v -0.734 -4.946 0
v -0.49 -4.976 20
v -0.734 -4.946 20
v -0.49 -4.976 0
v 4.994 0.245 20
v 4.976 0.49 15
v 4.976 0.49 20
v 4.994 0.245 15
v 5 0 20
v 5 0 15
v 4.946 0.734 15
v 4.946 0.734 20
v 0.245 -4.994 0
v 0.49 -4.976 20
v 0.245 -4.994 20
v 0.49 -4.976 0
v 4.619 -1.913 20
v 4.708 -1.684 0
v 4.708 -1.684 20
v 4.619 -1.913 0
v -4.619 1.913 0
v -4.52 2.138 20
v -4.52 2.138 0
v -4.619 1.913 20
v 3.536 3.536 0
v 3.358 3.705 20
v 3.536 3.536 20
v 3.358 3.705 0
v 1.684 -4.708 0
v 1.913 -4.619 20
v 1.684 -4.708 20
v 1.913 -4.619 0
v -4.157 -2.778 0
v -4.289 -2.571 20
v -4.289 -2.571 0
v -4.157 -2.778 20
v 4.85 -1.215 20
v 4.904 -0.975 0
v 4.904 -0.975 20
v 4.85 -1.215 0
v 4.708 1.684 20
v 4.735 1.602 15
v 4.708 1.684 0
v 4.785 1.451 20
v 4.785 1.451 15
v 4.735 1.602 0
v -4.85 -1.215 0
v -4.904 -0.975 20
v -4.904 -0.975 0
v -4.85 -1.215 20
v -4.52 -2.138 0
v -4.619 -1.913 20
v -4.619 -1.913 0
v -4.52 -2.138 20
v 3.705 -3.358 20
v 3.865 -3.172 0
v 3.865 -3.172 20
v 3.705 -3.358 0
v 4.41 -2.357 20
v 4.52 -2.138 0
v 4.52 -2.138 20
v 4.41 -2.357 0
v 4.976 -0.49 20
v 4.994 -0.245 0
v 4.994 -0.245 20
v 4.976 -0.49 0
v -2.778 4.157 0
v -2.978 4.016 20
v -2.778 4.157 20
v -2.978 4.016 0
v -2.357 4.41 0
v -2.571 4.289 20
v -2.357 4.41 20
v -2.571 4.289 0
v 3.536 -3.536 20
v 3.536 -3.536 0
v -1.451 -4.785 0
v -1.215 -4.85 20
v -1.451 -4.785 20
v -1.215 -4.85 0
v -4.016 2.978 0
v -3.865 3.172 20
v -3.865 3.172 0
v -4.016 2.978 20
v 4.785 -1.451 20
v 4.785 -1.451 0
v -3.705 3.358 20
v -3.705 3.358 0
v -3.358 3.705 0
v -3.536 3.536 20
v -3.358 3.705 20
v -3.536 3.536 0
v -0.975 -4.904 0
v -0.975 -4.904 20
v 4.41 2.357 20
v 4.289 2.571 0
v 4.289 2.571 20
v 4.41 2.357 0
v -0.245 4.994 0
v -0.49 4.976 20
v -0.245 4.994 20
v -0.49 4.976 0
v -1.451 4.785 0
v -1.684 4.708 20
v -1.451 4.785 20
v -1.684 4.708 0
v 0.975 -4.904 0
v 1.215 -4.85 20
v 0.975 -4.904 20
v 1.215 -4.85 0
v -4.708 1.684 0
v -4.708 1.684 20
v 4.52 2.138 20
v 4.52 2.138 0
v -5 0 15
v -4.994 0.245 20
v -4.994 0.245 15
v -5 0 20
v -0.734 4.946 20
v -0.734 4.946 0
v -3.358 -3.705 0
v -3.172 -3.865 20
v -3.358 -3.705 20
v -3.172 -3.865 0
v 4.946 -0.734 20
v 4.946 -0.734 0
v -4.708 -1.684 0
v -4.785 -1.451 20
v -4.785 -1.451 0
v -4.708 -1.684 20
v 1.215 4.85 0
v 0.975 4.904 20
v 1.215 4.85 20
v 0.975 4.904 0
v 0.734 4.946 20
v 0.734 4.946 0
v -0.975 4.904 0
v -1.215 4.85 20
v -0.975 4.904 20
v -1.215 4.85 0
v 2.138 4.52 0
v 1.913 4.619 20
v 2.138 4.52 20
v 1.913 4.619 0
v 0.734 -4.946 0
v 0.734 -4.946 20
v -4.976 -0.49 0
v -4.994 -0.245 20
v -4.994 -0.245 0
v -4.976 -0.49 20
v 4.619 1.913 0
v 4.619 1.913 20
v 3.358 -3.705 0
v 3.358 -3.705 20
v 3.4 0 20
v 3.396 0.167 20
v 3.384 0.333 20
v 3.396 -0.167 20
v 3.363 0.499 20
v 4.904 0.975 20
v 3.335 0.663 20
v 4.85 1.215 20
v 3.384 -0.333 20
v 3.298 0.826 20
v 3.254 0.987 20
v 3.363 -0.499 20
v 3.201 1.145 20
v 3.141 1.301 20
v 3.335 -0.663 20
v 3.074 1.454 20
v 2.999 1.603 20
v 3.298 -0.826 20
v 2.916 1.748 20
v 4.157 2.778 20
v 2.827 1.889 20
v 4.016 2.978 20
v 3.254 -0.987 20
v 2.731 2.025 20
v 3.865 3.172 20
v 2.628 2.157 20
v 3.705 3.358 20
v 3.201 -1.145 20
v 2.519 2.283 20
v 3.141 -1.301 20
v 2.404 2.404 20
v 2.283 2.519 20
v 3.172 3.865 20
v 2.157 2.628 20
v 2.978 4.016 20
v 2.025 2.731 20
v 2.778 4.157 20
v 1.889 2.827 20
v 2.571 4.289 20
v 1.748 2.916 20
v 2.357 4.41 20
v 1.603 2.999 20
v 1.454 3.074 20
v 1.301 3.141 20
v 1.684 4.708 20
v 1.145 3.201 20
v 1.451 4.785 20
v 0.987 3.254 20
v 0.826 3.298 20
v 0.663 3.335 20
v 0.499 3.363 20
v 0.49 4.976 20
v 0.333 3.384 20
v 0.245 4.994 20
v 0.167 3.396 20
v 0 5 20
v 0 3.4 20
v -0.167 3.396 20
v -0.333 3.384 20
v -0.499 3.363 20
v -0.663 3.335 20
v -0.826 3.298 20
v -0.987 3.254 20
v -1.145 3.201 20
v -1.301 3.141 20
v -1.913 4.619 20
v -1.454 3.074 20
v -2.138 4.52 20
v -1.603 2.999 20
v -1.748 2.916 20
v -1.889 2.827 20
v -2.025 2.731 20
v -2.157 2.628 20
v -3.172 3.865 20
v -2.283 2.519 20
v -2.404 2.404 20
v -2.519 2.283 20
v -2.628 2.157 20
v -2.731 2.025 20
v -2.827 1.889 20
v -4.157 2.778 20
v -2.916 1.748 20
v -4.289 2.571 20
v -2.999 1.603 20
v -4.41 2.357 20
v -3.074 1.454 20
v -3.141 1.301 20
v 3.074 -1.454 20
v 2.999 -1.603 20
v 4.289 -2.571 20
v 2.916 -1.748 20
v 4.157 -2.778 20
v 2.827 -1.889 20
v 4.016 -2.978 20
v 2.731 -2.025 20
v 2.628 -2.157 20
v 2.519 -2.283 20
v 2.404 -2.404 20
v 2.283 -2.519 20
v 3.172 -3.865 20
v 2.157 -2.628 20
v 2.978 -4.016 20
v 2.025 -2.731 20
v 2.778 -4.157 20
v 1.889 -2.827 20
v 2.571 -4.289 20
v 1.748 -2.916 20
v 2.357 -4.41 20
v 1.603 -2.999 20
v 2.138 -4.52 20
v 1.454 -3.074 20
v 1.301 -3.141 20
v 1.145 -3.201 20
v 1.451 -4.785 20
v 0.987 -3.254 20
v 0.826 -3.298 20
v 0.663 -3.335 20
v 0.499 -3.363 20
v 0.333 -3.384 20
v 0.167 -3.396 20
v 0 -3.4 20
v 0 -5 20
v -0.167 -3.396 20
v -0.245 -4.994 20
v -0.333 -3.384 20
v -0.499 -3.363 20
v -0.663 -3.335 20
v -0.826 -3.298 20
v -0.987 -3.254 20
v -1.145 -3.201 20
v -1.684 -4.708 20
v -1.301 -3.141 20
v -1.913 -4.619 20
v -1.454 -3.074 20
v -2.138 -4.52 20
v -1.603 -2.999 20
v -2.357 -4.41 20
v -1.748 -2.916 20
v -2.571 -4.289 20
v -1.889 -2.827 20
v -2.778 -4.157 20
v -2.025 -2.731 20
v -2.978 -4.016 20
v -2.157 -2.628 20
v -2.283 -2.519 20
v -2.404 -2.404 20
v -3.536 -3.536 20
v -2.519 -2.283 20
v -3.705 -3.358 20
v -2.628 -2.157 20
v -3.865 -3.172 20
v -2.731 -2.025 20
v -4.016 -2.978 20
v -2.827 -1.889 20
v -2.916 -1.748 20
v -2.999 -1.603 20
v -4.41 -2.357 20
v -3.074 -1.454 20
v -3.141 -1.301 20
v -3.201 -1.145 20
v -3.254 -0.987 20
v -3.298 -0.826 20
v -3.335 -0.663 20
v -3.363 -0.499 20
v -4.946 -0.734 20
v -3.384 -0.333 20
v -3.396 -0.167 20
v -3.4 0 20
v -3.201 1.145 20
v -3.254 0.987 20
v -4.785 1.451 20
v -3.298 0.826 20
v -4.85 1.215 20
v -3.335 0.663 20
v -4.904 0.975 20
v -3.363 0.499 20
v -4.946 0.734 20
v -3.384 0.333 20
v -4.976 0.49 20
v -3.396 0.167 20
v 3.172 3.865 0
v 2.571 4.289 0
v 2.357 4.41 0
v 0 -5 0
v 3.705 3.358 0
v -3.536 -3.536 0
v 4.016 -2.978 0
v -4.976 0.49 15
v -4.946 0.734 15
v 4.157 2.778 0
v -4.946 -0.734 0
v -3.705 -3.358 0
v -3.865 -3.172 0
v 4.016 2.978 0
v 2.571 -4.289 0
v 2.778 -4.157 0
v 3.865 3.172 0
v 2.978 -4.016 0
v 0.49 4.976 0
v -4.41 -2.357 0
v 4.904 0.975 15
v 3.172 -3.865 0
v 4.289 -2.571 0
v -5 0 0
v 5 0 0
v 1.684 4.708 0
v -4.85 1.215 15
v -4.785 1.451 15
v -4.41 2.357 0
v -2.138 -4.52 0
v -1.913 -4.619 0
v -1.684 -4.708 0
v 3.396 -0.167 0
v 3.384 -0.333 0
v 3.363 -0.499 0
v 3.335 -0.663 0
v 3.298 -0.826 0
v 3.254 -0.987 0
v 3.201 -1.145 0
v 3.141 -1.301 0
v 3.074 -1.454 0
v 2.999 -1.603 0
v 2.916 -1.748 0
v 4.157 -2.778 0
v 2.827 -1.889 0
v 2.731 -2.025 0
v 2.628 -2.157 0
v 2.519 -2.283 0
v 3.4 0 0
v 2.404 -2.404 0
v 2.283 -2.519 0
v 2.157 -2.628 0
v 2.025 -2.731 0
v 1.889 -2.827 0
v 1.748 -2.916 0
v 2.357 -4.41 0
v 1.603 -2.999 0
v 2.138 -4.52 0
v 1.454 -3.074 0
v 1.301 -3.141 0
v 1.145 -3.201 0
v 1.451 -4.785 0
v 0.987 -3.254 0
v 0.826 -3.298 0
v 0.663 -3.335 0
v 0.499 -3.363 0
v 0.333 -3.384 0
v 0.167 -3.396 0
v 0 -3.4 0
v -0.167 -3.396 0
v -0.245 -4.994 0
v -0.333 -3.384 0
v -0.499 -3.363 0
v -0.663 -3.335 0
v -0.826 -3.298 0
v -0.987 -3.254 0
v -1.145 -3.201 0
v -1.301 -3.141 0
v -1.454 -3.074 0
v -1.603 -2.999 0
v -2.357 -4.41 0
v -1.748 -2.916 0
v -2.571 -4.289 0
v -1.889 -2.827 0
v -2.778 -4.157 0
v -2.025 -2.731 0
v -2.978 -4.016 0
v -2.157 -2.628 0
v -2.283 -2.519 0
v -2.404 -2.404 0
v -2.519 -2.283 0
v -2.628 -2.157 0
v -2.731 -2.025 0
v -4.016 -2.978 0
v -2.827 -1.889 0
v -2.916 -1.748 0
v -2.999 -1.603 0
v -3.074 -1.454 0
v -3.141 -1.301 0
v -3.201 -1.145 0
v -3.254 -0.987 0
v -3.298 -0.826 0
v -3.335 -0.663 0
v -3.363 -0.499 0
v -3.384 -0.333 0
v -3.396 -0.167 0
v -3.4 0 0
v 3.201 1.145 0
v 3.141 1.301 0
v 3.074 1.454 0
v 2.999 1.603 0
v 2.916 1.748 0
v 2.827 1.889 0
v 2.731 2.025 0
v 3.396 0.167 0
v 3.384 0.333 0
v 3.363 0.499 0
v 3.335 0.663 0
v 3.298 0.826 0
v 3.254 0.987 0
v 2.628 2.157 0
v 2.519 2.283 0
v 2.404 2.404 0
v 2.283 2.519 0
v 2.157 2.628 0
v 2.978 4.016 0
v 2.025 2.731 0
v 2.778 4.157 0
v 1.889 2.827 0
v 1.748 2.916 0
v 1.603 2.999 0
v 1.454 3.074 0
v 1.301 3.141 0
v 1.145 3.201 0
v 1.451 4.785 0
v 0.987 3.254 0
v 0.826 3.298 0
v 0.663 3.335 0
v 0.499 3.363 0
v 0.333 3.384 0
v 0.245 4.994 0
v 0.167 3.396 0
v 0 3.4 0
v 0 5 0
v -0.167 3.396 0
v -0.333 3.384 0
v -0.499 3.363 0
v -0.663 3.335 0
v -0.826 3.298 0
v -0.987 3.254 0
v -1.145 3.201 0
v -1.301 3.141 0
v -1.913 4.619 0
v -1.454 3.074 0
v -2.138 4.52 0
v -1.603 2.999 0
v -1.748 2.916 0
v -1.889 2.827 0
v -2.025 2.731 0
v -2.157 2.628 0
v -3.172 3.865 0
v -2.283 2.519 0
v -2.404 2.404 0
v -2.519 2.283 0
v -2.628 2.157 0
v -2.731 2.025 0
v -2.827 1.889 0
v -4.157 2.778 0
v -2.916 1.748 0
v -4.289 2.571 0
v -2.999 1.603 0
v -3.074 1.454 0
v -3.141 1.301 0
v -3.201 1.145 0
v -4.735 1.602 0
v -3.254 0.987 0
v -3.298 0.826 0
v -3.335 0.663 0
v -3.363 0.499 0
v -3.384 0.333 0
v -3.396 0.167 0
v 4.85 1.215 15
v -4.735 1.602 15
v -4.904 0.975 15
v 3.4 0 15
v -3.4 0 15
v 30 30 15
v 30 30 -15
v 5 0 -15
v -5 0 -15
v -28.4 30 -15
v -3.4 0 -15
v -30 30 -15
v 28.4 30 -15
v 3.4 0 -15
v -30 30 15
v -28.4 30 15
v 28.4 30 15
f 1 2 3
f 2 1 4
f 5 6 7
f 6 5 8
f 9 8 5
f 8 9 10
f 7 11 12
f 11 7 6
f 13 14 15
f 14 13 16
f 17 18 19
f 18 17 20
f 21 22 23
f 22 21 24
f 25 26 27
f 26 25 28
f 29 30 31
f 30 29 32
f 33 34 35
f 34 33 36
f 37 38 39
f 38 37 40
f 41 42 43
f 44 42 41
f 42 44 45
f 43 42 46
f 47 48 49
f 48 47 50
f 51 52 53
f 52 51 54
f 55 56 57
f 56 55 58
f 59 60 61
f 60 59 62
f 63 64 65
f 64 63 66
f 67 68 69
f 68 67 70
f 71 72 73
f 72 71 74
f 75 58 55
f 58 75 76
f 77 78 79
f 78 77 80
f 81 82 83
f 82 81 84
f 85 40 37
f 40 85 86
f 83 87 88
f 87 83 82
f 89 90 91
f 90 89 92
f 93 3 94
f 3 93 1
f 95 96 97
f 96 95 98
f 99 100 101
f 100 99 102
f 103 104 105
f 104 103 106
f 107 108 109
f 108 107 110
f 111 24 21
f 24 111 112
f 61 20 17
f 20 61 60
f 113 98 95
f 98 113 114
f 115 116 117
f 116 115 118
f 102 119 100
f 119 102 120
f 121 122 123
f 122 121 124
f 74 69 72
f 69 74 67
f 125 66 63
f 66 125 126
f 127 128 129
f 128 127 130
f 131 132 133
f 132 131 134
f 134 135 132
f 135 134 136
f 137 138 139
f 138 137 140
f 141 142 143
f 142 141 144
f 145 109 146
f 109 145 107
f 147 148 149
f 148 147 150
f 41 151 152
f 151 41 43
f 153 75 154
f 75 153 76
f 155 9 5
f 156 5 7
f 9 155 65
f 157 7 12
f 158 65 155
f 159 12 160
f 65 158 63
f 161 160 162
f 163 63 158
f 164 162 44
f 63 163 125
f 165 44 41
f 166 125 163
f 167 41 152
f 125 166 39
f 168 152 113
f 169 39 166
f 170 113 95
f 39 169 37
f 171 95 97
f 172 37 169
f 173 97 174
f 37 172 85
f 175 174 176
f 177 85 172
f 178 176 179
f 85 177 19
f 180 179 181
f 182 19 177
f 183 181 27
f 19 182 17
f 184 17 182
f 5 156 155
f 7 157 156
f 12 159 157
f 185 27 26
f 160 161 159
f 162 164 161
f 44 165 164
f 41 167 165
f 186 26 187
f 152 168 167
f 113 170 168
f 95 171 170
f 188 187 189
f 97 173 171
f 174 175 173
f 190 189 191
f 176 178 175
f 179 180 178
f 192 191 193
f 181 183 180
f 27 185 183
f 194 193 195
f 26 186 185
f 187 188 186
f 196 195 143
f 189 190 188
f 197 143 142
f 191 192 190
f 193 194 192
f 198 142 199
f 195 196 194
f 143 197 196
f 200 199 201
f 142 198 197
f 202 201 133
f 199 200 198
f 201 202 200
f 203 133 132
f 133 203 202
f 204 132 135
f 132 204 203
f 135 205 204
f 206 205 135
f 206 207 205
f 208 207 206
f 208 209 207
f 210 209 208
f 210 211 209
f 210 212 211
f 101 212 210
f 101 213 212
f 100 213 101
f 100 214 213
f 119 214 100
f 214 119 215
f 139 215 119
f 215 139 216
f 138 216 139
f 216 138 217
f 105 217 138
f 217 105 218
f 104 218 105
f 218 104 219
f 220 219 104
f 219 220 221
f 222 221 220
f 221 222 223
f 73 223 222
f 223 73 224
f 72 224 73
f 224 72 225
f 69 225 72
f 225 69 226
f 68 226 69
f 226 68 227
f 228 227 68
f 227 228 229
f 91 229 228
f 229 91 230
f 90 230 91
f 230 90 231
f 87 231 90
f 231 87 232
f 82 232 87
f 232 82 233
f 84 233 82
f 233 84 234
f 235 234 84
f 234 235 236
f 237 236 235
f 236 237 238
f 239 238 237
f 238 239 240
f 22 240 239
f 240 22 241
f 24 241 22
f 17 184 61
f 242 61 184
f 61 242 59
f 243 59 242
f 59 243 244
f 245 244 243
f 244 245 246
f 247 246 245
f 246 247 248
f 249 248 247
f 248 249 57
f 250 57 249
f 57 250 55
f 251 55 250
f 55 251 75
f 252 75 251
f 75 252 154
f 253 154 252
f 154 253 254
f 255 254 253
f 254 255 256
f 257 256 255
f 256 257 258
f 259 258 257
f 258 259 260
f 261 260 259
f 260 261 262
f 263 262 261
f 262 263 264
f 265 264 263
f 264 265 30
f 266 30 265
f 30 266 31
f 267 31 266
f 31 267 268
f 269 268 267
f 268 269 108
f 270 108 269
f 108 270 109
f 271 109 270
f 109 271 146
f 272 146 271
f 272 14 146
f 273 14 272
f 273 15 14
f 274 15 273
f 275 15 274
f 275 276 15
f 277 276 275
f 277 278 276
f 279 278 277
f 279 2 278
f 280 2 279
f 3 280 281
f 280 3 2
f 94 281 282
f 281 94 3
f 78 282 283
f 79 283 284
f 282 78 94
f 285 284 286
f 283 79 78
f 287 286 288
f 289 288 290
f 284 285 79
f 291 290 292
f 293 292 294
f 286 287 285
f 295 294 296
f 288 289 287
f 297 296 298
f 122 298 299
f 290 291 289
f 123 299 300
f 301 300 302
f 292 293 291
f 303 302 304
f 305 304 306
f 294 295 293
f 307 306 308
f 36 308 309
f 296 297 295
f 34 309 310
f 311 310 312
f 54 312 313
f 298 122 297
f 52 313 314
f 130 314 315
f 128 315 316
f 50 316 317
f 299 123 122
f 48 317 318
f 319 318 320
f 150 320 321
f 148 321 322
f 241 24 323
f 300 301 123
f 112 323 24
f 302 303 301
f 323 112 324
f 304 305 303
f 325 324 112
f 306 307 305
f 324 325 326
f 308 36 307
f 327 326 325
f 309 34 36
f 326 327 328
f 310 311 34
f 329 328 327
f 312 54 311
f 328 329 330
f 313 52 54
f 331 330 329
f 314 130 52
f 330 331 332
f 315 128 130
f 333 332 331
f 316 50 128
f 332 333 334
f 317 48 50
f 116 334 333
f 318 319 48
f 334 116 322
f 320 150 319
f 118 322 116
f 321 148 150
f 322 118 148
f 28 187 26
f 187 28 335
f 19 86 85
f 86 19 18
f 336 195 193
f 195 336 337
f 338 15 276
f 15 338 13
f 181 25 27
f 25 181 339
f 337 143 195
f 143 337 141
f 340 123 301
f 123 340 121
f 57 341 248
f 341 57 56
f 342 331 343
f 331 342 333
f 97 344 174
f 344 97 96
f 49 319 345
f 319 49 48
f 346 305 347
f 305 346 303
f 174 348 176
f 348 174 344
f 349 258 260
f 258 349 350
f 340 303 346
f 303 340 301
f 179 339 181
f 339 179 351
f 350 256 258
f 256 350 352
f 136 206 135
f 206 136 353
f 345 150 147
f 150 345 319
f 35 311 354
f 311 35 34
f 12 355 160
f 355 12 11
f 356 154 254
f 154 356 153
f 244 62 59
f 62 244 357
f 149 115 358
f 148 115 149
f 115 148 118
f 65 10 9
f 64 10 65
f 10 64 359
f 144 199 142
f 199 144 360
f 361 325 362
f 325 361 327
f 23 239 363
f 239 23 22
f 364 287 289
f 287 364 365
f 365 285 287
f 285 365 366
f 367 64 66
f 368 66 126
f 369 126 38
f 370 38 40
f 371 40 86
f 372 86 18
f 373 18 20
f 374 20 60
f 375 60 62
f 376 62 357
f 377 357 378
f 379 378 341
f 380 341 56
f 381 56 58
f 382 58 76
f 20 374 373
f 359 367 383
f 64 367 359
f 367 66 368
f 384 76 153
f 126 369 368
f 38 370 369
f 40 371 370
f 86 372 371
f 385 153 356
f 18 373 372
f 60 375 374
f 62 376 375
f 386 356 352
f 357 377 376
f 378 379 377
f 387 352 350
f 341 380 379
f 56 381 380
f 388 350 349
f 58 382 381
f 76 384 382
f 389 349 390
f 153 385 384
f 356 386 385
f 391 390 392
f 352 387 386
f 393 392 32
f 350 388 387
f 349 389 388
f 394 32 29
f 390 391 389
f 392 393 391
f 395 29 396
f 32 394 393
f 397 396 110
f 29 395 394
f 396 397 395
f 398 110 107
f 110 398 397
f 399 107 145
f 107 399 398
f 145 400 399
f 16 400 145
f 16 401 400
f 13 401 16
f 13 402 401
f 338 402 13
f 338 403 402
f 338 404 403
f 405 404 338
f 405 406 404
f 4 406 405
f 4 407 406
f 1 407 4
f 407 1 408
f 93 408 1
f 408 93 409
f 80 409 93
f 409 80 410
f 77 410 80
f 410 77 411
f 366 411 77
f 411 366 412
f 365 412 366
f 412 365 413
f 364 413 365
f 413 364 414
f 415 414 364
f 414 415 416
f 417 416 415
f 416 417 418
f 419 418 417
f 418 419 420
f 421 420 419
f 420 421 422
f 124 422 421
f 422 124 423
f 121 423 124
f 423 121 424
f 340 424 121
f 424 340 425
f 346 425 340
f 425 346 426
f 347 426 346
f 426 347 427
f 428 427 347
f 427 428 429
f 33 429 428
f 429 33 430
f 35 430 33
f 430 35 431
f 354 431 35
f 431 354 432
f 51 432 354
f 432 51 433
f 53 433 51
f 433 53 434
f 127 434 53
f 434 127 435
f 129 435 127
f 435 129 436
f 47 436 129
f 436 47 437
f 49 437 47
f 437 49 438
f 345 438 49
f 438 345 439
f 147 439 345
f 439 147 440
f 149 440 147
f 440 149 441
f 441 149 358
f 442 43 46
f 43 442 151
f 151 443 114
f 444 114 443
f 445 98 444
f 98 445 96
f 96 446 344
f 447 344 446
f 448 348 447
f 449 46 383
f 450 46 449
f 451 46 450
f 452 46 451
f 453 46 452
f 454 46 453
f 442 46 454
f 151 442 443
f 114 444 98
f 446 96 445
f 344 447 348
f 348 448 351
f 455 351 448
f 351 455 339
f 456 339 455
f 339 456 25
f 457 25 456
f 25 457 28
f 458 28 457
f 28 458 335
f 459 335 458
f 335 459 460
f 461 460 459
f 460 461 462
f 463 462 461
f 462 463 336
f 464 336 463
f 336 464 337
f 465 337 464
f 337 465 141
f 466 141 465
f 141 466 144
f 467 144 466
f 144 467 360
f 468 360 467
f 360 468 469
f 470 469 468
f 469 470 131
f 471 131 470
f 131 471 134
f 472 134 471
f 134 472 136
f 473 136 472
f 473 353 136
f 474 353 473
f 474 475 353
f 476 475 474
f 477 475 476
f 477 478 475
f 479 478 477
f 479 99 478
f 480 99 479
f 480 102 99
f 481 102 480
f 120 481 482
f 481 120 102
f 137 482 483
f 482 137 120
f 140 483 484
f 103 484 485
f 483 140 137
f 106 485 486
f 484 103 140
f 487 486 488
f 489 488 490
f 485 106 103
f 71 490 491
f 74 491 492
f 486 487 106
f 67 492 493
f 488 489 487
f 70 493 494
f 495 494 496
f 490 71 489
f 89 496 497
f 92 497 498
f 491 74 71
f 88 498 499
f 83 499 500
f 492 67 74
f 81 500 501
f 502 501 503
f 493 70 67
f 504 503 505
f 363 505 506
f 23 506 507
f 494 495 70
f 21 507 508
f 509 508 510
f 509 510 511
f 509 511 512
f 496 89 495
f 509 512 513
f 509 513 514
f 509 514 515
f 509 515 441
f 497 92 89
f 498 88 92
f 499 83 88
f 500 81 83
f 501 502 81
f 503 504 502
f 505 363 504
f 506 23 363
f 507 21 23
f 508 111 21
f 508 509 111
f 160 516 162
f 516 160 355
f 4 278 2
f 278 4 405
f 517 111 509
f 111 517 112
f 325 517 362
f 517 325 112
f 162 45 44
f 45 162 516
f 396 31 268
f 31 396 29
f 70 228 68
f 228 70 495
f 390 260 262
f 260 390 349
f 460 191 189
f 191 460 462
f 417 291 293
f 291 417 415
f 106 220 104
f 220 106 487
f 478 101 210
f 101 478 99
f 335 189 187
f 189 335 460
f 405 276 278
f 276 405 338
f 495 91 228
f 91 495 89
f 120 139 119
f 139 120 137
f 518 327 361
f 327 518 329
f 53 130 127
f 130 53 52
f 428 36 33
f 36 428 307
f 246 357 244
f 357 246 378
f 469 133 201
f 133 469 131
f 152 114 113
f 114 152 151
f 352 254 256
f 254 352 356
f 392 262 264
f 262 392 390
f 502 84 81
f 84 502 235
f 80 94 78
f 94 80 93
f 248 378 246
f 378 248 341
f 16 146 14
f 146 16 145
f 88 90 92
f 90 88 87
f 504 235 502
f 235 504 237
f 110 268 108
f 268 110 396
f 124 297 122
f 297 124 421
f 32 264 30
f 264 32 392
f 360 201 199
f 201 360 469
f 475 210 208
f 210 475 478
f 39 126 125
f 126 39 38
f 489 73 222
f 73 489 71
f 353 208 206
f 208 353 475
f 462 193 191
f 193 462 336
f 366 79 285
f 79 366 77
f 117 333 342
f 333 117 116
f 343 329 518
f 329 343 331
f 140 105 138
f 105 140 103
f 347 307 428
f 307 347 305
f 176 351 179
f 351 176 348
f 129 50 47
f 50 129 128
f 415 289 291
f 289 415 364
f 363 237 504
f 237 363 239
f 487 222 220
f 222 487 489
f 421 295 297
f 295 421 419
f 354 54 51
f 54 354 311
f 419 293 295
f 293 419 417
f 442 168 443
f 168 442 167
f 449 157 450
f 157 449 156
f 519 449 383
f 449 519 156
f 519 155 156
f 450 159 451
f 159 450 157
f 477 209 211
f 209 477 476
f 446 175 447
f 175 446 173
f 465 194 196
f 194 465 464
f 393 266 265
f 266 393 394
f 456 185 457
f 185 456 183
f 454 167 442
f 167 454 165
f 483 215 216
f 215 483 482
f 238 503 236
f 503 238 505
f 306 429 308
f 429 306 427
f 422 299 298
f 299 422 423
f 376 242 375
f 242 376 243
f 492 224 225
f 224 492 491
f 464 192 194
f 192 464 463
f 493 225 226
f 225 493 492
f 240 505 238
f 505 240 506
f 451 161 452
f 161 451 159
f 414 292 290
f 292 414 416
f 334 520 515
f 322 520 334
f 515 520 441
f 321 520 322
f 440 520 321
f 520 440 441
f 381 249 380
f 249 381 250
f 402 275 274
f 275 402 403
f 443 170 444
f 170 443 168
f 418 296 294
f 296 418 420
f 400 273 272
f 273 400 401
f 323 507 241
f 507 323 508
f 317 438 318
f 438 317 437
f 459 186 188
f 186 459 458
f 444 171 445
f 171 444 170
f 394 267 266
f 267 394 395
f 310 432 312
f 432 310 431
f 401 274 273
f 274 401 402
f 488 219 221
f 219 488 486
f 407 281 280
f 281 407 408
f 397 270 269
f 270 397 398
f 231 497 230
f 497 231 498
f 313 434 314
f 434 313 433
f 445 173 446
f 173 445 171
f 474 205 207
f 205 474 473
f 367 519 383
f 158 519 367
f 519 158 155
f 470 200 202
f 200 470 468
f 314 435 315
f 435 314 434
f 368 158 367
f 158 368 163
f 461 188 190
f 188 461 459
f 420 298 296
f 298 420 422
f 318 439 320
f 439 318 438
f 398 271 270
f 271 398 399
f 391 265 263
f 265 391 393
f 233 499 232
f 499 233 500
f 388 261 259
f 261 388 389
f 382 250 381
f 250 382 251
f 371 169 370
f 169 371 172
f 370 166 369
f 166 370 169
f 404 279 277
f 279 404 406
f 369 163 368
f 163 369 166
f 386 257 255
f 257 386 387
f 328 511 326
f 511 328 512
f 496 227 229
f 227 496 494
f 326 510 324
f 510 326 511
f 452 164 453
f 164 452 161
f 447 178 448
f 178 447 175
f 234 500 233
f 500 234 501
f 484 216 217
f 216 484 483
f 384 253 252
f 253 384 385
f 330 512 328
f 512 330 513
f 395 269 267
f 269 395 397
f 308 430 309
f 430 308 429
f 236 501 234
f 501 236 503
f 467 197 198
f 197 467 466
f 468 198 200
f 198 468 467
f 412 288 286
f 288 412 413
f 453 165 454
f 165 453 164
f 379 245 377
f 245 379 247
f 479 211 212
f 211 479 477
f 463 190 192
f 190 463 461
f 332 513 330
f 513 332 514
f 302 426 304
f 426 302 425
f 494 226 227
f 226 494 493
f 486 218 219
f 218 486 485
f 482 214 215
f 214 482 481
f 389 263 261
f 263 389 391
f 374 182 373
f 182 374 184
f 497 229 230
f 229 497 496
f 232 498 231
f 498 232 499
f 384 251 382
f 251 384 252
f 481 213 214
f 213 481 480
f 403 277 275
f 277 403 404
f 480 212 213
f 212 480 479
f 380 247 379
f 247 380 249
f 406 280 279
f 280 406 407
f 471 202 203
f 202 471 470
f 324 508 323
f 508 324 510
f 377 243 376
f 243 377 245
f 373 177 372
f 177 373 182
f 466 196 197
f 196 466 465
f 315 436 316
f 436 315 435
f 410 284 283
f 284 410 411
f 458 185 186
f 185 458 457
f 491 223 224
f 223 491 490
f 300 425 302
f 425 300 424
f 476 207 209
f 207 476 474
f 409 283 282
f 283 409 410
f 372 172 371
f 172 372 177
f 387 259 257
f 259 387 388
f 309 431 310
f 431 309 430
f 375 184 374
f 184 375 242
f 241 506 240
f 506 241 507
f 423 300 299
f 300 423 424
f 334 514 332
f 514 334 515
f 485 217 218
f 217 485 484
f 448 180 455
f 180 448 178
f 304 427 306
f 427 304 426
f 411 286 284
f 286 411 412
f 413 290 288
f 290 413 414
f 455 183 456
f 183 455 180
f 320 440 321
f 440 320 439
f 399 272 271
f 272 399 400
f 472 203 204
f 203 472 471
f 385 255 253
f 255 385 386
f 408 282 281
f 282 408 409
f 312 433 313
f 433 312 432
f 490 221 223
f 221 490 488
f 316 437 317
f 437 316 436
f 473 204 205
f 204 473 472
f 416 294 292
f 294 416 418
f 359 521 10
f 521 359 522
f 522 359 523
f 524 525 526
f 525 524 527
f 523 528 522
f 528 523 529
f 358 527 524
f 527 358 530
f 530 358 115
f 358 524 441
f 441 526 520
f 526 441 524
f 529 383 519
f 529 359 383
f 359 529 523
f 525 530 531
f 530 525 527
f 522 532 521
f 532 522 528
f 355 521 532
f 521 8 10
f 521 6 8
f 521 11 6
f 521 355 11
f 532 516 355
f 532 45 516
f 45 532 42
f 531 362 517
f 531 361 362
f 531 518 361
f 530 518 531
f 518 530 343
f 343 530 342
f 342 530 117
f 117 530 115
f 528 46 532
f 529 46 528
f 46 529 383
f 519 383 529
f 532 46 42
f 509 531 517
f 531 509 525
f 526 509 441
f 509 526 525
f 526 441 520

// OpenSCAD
// Lab Funnel Design
// Units: millimetres
// Orientation: Upright, wide opening at top, rests on XY plane at z=0.

// --- Dimensions ---
// Spout (Tube)
$spout_outer_diameter = 10;
$spout_inner_diameter = 6.8; // 10 - 2*1.6
$spout_length = 20;

// Cone (Funnel Body)
$cone_bottom_diameter = 10; // Matches spout outer diameter
$cone_top_diameter = 60;
$cone_height = 30; // From z=20 to z=50

// Wall Thickness
$wall_thickness = 1.6;

// Resolution for smooth curves
$fn = 128;

// --- Helper Functions ---
// Creates a hollow cylinder (tube)
module hollow_cylinder(outer_d, inner_d, height) {
    difference() {
        cylinder(h = height, d = outer_d, $fn = $fn);
        cylinder(h = height, d = inner_d, $fn = $fn);
    }
}

// Creates a hollow cone (funnel shape)
// bottom_d: diameter at the smaller end (z=0 relative to cone)
// top_d: diameter at the larger end (z=height relative to cone)
module hollow_cone(bottom_d, top_d, height) {
    difference() {
        // Outer Cone
        linear_extrude(height = height, center = true) {
            polygon(points = [
                [-bottom_d/2, 0],
                [bottom_d/2, 0],
                [top_d/2, height],
                [-top_d/2, height]
            ]);
        }
        
        // Inner Cone (Bore)
        // Calculate inner diameters at bottom and top
        inner_bottom_d = bottom_d - 2 * $wall_thickness;
        inner_top_d = top_d - 2 * $wall_thickness;
        
        linear_extrude(height = height, center = true) {
            polygon(points = [
                [-inner_bottom_d/2, 0],
                [inner_bottom_d/2, 0],
                [inner_top_d/2, height],
                [-inner_top_d/2, height]
            ]);
        }
    }
}

// --- Main Assembly ---
// The part rests on the XY plane at z = 0.
// The spout runs from z = 0 to z = 20.
// The cone widens from z = 20 to z = 50.

translate([0, 0, 0]) {
    union() {
        // 1. The Spout (Tube)
        // Located from z=0 to z=20
        hollow_cylinder(
            outer_d = $spout_outer_diameter,
            inner_d = $spout_inner_diameter,
            height = $spout_length
        );
        
        // 2. The Cone (Funnel Body)
        // Located from z=20 to z=50
        // Bottom diameter matches spout outer diameter (10mm)
        // Top diameter is 60mm
        hollow_cone(
            bottom_d = $spout_outer_diameter,
            top_d = $cone_top_diameter,
            height = $cone_height
        );
    }
}
